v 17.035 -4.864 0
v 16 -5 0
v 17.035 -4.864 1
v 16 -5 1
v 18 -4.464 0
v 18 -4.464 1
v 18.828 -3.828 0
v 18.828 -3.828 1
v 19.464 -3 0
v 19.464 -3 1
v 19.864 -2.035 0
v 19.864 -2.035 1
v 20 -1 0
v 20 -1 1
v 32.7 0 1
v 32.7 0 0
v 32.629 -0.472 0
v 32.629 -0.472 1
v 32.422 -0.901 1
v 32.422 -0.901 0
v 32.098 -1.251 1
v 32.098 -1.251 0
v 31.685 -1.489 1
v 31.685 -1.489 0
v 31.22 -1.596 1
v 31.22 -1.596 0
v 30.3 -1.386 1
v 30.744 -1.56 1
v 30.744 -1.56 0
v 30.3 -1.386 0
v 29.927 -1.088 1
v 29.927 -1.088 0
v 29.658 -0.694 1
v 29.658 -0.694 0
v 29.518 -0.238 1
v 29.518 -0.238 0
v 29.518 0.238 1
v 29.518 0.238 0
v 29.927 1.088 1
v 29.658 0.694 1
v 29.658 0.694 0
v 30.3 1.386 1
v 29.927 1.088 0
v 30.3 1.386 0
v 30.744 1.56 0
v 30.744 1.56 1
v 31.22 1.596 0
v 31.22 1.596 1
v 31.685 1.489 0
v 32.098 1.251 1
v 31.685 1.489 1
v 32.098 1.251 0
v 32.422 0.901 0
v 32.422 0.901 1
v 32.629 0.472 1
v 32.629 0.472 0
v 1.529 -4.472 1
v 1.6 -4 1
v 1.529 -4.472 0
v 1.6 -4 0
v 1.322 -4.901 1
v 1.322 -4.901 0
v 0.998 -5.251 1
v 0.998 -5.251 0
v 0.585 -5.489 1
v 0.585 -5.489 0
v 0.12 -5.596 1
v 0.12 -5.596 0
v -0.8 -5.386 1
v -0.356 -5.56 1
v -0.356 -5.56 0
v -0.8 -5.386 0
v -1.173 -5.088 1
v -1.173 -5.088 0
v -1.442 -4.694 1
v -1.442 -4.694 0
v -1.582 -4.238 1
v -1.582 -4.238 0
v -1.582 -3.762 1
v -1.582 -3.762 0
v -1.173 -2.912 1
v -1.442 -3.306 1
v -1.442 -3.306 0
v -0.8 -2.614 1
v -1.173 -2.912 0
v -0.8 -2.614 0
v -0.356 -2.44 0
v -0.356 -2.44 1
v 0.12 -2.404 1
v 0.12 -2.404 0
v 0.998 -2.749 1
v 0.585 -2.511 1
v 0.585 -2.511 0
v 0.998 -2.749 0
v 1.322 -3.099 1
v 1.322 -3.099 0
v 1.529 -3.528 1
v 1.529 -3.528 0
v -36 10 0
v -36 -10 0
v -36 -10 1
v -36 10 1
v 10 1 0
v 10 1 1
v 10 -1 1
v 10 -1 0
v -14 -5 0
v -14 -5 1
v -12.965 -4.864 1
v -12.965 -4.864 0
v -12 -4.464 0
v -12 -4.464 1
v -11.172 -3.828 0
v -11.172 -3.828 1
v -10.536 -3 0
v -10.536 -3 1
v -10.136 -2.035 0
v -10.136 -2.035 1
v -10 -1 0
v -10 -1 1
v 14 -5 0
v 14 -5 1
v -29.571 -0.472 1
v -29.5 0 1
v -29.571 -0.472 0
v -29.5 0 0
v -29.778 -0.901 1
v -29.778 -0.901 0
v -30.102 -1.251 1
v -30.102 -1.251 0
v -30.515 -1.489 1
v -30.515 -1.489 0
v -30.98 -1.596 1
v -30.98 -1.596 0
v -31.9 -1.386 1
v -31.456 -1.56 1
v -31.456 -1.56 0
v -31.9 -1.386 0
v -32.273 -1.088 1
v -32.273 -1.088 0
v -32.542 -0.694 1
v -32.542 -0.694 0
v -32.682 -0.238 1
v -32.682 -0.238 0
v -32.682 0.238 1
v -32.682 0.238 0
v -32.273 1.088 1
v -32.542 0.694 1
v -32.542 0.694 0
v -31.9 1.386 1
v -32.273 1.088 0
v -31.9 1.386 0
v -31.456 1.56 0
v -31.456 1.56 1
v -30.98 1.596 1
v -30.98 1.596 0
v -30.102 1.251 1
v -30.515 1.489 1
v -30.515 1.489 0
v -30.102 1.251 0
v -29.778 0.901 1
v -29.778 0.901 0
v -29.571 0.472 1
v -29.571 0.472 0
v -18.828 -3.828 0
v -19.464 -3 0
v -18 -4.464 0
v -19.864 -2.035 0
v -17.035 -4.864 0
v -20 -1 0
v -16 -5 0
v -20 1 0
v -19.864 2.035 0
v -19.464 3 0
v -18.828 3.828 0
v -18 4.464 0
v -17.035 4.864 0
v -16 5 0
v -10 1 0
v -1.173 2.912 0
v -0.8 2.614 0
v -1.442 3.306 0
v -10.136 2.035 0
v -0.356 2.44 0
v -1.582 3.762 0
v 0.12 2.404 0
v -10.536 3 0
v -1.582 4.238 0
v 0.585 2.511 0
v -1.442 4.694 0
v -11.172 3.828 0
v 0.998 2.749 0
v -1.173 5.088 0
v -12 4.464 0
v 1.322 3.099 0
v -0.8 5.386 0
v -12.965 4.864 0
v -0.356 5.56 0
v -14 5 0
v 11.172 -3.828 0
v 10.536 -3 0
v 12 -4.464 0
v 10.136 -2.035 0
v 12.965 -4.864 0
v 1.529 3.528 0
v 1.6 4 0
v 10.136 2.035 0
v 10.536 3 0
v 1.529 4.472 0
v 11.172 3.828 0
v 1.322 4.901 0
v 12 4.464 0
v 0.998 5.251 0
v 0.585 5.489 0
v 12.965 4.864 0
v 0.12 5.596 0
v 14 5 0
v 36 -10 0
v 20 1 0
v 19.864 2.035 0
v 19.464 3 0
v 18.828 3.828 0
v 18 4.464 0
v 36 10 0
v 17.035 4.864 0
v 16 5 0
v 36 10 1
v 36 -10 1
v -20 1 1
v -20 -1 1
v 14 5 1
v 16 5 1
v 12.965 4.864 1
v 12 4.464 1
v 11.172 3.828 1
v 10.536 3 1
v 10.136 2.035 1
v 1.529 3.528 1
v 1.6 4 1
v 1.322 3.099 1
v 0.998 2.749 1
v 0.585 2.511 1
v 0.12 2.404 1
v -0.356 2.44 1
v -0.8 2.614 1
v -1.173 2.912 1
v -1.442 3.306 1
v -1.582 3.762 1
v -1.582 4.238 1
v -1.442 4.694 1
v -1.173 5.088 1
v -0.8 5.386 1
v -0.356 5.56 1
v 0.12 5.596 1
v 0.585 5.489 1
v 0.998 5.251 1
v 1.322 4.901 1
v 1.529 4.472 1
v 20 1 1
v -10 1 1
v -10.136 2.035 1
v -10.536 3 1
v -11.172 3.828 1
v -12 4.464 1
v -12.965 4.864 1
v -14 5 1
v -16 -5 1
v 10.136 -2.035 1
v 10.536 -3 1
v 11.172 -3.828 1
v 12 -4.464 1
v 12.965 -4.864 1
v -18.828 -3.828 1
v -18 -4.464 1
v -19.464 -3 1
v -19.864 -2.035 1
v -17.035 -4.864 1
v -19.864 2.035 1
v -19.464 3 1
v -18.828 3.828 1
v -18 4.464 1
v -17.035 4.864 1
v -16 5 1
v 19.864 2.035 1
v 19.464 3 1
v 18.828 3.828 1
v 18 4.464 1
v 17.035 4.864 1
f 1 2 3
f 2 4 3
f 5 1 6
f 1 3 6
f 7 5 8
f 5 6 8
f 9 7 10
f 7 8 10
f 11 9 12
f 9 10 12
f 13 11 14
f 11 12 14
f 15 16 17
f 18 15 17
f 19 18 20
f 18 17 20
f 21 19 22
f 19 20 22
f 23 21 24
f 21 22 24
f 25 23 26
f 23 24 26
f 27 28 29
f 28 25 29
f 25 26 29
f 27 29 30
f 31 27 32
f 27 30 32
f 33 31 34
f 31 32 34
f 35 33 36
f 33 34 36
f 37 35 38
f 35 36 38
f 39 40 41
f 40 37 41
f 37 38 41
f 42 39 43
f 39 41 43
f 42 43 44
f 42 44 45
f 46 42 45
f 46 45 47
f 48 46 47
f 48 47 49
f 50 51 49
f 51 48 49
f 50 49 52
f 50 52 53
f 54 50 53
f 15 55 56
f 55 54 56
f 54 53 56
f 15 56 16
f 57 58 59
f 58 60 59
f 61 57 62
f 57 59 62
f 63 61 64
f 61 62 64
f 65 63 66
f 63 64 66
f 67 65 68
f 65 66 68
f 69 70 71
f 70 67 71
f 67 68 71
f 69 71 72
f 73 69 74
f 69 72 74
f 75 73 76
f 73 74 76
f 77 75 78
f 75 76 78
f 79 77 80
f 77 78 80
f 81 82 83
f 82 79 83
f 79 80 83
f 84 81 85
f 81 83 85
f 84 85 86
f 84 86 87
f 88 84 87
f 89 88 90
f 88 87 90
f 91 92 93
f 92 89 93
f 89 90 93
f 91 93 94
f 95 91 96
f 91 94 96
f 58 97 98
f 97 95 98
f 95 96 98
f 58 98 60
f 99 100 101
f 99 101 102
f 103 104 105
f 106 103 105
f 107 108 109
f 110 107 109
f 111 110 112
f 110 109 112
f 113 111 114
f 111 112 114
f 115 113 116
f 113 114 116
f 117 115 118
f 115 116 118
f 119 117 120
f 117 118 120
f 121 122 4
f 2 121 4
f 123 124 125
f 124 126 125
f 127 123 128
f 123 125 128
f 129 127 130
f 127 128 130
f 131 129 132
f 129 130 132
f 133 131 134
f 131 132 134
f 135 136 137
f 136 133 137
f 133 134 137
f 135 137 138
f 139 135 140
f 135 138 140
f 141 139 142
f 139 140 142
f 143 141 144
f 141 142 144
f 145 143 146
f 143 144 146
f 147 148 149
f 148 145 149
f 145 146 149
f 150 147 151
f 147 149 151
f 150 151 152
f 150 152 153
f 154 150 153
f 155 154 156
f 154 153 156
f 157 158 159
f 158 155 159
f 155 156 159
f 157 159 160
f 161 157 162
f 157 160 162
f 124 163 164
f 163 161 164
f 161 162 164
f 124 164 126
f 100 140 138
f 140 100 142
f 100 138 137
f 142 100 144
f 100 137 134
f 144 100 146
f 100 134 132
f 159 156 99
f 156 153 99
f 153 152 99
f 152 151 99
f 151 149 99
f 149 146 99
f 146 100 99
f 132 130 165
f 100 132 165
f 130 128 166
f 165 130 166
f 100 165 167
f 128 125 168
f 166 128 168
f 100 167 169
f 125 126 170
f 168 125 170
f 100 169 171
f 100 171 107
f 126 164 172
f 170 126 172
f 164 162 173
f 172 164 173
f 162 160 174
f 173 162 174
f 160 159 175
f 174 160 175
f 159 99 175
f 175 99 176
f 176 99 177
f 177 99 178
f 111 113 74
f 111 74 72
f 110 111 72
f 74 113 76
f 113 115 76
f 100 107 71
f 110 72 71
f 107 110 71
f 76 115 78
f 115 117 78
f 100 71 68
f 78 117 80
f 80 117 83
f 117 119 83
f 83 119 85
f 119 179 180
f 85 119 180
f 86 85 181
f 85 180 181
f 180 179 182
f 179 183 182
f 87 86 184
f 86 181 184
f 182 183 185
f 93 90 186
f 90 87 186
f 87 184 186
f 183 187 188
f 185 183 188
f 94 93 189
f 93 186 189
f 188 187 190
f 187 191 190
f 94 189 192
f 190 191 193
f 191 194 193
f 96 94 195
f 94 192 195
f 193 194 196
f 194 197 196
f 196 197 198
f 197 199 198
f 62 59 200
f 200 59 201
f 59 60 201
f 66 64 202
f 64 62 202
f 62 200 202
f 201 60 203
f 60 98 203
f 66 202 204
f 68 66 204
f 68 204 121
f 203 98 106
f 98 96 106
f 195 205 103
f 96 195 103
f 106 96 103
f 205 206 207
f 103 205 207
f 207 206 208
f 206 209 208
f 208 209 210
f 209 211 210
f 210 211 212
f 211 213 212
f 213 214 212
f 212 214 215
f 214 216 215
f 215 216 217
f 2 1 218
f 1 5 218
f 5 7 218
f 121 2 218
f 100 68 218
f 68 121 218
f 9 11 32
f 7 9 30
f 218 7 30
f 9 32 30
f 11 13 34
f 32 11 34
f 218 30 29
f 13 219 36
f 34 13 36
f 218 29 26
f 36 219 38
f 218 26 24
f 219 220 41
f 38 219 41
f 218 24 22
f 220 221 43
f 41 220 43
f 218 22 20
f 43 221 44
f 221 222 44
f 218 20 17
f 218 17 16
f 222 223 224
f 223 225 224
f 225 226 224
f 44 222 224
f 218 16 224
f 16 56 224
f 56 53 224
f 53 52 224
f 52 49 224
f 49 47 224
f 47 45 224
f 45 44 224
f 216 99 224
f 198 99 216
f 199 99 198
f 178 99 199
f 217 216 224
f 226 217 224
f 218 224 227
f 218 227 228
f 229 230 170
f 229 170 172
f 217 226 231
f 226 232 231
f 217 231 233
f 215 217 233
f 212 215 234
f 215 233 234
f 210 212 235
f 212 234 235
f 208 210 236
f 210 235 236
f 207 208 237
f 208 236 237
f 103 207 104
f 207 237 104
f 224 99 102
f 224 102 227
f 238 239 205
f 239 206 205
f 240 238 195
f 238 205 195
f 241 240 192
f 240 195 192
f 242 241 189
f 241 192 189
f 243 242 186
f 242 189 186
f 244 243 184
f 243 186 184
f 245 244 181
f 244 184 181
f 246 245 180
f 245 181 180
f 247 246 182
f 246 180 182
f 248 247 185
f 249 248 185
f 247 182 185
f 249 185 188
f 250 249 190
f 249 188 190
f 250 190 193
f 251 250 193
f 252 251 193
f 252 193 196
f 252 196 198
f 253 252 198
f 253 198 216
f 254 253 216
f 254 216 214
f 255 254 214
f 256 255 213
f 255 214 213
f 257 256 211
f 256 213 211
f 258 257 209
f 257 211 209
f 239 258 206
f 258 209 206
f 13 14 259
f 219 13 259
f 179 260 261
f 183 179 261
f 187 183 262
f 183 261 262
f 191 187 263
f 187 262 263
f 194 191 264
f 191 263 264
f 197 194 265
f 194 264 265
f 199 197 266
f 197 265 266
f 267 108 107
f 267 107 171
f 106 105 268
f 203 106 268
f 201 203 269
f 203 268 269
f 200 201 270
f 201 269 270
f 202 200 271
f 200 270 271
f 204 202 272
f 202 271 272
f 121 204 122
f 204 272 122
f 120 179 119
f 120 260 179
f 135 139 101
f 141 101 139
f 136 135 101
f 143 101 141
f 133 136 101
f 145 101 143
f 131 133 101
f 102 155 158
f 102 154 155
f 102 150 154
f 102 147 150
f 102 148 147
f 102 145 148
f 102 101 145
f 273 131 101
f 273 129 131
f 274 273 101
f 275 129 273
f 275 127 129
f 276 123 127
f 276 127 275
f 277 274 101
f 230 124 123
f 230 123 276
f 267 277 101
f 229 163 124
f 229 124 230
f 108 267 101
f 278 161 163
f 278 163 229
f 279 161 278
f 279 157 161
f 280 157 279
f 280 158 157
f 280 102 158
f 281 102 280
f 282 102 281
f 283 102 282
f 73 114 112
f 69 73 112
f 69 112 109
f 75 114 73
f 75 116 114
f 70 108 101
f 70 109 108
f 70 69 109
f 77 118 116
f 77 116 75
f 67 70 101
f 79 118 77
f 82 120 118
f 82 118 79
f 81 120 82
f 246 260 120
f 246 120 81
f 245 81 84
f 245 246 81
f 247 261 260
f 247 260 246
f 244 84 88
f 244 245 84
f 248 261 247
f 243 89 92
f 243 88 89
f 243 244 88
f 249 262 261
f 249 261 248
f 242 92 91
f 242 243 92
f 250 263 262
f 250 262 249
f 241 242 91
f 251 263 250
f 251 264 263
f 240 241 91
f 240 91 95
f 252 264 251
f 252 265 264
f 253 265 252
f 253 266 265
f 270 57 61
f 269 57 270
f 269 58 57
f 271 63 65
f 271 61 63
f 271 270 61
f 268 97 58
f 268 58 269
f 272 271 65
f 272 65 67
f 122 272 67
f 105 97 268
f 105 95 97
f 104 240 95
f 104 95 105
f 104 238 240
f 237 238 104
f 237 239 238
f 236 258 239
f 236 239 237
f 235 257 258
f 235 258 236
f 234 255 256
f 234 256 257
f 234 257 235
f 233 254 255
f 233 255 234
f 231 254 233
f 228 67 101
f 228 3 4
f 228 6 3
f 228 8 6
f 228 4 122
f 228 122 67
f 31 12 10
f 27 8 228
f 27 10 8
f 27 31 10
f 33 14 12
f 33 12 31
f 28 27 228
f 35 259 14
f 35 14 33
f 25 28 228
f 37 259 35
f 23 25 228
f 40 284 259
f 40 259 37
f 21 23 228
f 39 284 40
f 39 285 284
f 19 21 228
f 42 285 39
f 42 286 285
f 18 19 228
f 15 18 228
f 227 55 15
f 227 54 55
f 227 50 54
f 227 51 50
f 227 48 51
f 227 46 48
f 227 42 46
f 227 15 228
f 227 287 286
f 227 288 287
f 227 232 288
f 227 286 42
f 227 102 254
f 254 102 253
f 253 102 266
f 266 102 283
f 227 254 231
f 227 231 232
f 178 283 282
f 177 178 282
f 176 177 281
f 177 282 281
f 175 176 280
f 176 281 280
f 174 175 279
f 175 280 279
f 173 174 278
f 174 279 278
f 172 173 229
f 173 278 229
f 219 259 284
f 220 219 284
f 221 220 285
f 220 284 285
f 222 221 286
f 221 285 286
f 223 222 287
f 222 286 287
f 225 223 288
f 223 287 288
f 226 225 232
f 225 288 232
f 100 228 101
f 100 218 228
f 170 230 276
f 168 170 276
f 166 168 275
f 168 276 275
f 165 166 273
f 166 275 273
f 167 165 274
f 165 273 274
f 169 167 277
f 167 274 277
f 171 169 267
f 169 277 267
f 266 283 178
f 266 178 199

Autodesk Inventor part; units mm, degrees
ref_plane "YZ Plane" through (0, 0, 0) normal (1, 0, 0) x (0, 1, 0)
ref_plane "XZ Plane" through (0, 0, 0) normal (0, 1, 0) x (-1, 0, 0)
ref_plane "XY Plane" through (0, 0, 0) normal (0, 0, 1) x (1, 0, 0)
sketch "Sketch2" plane through (0, 0, 1) normal (0, 0, 1) x (1, 0, 0)
  line L0 (-17.5, 32.5) -> (-12.5, 32.5)
  line L1 (-7.5, 27.5) -> (-7.5, 12.5)
  line L2 (-12.5, 7.5) -> (-17.5, 7.5)
  line L3 (-22.5, 12.5) -> (-22.5, 27.5)
  line L4 (-22.5, 32.5) -> (-7.5, 7.5) construction
  line L5 (-7.5, 32.5) -> (-22.5, 7.5) construction
  line L6 (-15.4861, 0) -> (17.9861, 0)
  line L7 (0, 18.4722) -> (0, -18.4722)
  arc A0 (-17.5, 32.5) -> (-22.5, 27.5) centre (-17.5, 27.5) ccw
  arc A1 (-7.5, 27.5) -> (-12.5, 32.5) centre (-12.5, 27.5) ccw
  arc A2 (-12.5, 7.5) -> (-7.5, 12.5) centre (-12.5, 12.5) ccw
  arc A3 (-22.5, 12.5) -> (-17.5, 7.5) centre (-17.5, 12.5) ccw
  line L8 (17.5, 32.5) -> (12.5, 32.5)
  line L9 (7.5, 27.5) -> (7.5, 12.5)
  line L10 (12.5, 7.5) -> (17.5, 7.5)
  line L11 (22.5, 12.5) -> (22.5, 27.5)
  line L12 (22.5, 32.5) -> (7.5, 7.5) construction
  line L13 (7.5, 32.5) -> (22.5, 7.5) construction
  arc A4 (22.5, 27.5) -> (17.5, 32.5) centre (17.5, 27.5) ccw
  arc A5 (12.5, 32.5) -> (7.5, 27.5) centre (12.5, 27.5) ccw
  arc A6 (7.5, 12.5) -> (12.5, 7.5) centre (12.5, 12.5) ccw
  arc A7 (17.5, 7.5) -> (22.5, 12.5) centre (17.5, 12.5) ccw
  line L14 (-17.5, -32.5) -> (-12.5, -32.5)
  line L15 (-7.5, -27.5) -> (-7.5, -12.5)
  line L16 (-12.5, -7.5) -> (-17.5, -7.5)
  line L17 (-22.5, -12.5) -> (-22.5, -27.5)
  line L18 (-22.5, -32.5) -> (-7.5, -7.5) construction
  line L19 (-7.5, -32.5) -> (-22.5, -7.5) construction
  arc A8 (-22.5, -27.5) -> (-17.5, -32.5) centre (-17.5, -27.5) ccw
  arc A9 (-12.5, -32.5) -> (-7.5, -27.5) centre (-12.5, -27.5) ccw
  arc A10 (-7.5, -12.5) -> (-12.5, -7.5) centre (-12.5, -12.5) ccw
  arc A11 (-17.5, -7.5) -> (-22.5, -12.5) centre (-17.5, -12.5) ccw
  line L20 (12.5, -7.5) -> (17.5, -7.5)
  line L21 (7.5, -27.5) -> (7.5, -12.5)
  arc A12 (22.5, -12.5) -> (17.5, -7.5) centre (17.5, -12.5) ccw
  arc A13 (7.5, -27.5) -> (12.5, -32.5) centre (12.5, -27.5) ccw
  line L22 (17.5, -32.5) -> (12.5, -32.5)
  line L23 (7.5, -32.5) -> (22.5, -7.5) construction
  line L24 (22.5, -32.5) -> (7.5, -7.5) construction
  line L25 (22.5, -12.5) -> (22.5, -27.5)
  arc A14 (17.5, -32.5) -> (22.5, -27.5) centre (17.5, -27.5) ccw
  arc A15 (12.5, -7.5) -> (7.5, -12.5) centre (12.5, -12.5) ccw
  point P0 (0, 0)
  point P1 (-15, 20)
  point P2 (15, 20)
  point P3 (-15, -20)
  point P4 (15, -20)
  dimension "d11" = 15
  dimension "d12" = 15
  dimension "d13" = 25
  dimension "d14" = 15
  dimension "d15" = 5
sketch "Sketch1" plane through (0, 0, 0) normal (0, 0, 1) x (1, 0, 0)
  line L0 (-36, 10) -> (36, 10)
  line L1 (36, 10) -> (36, -10)
  line L2 (36, -10) -> (-36, -10)
  line L3 (-36, -10) -> (-36, 10)
  line L4 (-36, 10) -> (36, -10) construction
  line L5 (36, 10) -> (-36, -10) construction
  circle A0 centre (31.1, 0) radius 1.6
  line L6 (0, 0) -> (12.8976, 0)
  line L7 (0, 0) -> (0, 11.3109)
  circle A1 centre (-31.1, 0) radius 1.6
  circle A2 centre (0, -4) radius 1.6
  circle A3 centre (0, 4) radius 1.6
  dimension "d0" = 72
  dimension "d1" = 20
  dimension "d2" = 3.2
  dimension "d3" = 4.9
  dimension "d6" = 3.2
  dimension "d7" = 6
extrude "Plate1" add sketch "Sketch1" along normal blind 1
sketch "Sketch3" plane through (0, 0, 1) normal (0, 0, 1) x (1, 0, 0)
  line L0 (-16, 5) -> (-14, 5)
  line L1 (-10, 1) -> (-10, -1)
  line L2 (-14, -5) -> (-16, -5)
  line L3 (-20, -1) -> (-20, 1)
  line L4 (-20, 5) -> (-10, -5) construction
  line L5 (-10, 5) -> (-20, -5) construction
  arc A0 (-16, 5) -> (-20, 1) centre (-16, 1) ccw
  arc A1 (-20, -1) -> (-16, -5) centre (-16, -1) ccw
  arc A2 (-14, -5) -> (-10, -1) centre (-14, -1) ccw
  arc A3 (-10, 1) -> (-14, 5) centre (-14, 1) ccw
  line L6 (0, 0) -> (0, 13.3665)
  line L7 (16, 5) -> (14, 5)
  line L8 (10, 1) -> (10, -1)
  line L9 (14, -5) -> (16, -5)
  line L10 (20, -1) -> (20, 1)
  line L11 (20, 5) -> (10, -5) construction
  line L12 (10, 5) -> (20, -5) construction
  arc A4 (20, 1) -> (16, 5) centre (16, 1) ccw
  arc A5 (16, -5) -> (20, -1) centre (16, -1) ccw
  arc A6 (10, -1) -> (14, -5) centre (14, -1) ccw
  arc A7 (14, 5) -> (10, 1) centre (14, 1) ccw
  point P0 (-15, 0)
  point P1 (15, 0)
  dimension "d18" = 10
  dimension "d19" = 10
  dimension "d20" = 4
  dimension "d21" = 20
extrude "Cut2" cut sketch "Sketch3" against normal blind 1
equation "\"d22\" = 厚度"
equation "\"d5\" = 厚度"
equation "\"折彎半徑\" = 厚度"
equation "\"折彎離隙寬度\" = 厚度"
equation "\"折彎離隙深度\" = 0.5 * 厚度"
equation "\"轉角離隙大小\" = 4 * 厚度"
equation "\"最小剩餘\" = 2 * 厚度"
equation "\"轉移半徑\" = 折彎半徑"
equation "\"Jacobi半徑大小\" = 折彎半徑"
equation "\"間隙大小\" = 厚度"
equation "\"厚度\" = 1"
properties part number "battery_box_5V_front" material "Aluminum"
